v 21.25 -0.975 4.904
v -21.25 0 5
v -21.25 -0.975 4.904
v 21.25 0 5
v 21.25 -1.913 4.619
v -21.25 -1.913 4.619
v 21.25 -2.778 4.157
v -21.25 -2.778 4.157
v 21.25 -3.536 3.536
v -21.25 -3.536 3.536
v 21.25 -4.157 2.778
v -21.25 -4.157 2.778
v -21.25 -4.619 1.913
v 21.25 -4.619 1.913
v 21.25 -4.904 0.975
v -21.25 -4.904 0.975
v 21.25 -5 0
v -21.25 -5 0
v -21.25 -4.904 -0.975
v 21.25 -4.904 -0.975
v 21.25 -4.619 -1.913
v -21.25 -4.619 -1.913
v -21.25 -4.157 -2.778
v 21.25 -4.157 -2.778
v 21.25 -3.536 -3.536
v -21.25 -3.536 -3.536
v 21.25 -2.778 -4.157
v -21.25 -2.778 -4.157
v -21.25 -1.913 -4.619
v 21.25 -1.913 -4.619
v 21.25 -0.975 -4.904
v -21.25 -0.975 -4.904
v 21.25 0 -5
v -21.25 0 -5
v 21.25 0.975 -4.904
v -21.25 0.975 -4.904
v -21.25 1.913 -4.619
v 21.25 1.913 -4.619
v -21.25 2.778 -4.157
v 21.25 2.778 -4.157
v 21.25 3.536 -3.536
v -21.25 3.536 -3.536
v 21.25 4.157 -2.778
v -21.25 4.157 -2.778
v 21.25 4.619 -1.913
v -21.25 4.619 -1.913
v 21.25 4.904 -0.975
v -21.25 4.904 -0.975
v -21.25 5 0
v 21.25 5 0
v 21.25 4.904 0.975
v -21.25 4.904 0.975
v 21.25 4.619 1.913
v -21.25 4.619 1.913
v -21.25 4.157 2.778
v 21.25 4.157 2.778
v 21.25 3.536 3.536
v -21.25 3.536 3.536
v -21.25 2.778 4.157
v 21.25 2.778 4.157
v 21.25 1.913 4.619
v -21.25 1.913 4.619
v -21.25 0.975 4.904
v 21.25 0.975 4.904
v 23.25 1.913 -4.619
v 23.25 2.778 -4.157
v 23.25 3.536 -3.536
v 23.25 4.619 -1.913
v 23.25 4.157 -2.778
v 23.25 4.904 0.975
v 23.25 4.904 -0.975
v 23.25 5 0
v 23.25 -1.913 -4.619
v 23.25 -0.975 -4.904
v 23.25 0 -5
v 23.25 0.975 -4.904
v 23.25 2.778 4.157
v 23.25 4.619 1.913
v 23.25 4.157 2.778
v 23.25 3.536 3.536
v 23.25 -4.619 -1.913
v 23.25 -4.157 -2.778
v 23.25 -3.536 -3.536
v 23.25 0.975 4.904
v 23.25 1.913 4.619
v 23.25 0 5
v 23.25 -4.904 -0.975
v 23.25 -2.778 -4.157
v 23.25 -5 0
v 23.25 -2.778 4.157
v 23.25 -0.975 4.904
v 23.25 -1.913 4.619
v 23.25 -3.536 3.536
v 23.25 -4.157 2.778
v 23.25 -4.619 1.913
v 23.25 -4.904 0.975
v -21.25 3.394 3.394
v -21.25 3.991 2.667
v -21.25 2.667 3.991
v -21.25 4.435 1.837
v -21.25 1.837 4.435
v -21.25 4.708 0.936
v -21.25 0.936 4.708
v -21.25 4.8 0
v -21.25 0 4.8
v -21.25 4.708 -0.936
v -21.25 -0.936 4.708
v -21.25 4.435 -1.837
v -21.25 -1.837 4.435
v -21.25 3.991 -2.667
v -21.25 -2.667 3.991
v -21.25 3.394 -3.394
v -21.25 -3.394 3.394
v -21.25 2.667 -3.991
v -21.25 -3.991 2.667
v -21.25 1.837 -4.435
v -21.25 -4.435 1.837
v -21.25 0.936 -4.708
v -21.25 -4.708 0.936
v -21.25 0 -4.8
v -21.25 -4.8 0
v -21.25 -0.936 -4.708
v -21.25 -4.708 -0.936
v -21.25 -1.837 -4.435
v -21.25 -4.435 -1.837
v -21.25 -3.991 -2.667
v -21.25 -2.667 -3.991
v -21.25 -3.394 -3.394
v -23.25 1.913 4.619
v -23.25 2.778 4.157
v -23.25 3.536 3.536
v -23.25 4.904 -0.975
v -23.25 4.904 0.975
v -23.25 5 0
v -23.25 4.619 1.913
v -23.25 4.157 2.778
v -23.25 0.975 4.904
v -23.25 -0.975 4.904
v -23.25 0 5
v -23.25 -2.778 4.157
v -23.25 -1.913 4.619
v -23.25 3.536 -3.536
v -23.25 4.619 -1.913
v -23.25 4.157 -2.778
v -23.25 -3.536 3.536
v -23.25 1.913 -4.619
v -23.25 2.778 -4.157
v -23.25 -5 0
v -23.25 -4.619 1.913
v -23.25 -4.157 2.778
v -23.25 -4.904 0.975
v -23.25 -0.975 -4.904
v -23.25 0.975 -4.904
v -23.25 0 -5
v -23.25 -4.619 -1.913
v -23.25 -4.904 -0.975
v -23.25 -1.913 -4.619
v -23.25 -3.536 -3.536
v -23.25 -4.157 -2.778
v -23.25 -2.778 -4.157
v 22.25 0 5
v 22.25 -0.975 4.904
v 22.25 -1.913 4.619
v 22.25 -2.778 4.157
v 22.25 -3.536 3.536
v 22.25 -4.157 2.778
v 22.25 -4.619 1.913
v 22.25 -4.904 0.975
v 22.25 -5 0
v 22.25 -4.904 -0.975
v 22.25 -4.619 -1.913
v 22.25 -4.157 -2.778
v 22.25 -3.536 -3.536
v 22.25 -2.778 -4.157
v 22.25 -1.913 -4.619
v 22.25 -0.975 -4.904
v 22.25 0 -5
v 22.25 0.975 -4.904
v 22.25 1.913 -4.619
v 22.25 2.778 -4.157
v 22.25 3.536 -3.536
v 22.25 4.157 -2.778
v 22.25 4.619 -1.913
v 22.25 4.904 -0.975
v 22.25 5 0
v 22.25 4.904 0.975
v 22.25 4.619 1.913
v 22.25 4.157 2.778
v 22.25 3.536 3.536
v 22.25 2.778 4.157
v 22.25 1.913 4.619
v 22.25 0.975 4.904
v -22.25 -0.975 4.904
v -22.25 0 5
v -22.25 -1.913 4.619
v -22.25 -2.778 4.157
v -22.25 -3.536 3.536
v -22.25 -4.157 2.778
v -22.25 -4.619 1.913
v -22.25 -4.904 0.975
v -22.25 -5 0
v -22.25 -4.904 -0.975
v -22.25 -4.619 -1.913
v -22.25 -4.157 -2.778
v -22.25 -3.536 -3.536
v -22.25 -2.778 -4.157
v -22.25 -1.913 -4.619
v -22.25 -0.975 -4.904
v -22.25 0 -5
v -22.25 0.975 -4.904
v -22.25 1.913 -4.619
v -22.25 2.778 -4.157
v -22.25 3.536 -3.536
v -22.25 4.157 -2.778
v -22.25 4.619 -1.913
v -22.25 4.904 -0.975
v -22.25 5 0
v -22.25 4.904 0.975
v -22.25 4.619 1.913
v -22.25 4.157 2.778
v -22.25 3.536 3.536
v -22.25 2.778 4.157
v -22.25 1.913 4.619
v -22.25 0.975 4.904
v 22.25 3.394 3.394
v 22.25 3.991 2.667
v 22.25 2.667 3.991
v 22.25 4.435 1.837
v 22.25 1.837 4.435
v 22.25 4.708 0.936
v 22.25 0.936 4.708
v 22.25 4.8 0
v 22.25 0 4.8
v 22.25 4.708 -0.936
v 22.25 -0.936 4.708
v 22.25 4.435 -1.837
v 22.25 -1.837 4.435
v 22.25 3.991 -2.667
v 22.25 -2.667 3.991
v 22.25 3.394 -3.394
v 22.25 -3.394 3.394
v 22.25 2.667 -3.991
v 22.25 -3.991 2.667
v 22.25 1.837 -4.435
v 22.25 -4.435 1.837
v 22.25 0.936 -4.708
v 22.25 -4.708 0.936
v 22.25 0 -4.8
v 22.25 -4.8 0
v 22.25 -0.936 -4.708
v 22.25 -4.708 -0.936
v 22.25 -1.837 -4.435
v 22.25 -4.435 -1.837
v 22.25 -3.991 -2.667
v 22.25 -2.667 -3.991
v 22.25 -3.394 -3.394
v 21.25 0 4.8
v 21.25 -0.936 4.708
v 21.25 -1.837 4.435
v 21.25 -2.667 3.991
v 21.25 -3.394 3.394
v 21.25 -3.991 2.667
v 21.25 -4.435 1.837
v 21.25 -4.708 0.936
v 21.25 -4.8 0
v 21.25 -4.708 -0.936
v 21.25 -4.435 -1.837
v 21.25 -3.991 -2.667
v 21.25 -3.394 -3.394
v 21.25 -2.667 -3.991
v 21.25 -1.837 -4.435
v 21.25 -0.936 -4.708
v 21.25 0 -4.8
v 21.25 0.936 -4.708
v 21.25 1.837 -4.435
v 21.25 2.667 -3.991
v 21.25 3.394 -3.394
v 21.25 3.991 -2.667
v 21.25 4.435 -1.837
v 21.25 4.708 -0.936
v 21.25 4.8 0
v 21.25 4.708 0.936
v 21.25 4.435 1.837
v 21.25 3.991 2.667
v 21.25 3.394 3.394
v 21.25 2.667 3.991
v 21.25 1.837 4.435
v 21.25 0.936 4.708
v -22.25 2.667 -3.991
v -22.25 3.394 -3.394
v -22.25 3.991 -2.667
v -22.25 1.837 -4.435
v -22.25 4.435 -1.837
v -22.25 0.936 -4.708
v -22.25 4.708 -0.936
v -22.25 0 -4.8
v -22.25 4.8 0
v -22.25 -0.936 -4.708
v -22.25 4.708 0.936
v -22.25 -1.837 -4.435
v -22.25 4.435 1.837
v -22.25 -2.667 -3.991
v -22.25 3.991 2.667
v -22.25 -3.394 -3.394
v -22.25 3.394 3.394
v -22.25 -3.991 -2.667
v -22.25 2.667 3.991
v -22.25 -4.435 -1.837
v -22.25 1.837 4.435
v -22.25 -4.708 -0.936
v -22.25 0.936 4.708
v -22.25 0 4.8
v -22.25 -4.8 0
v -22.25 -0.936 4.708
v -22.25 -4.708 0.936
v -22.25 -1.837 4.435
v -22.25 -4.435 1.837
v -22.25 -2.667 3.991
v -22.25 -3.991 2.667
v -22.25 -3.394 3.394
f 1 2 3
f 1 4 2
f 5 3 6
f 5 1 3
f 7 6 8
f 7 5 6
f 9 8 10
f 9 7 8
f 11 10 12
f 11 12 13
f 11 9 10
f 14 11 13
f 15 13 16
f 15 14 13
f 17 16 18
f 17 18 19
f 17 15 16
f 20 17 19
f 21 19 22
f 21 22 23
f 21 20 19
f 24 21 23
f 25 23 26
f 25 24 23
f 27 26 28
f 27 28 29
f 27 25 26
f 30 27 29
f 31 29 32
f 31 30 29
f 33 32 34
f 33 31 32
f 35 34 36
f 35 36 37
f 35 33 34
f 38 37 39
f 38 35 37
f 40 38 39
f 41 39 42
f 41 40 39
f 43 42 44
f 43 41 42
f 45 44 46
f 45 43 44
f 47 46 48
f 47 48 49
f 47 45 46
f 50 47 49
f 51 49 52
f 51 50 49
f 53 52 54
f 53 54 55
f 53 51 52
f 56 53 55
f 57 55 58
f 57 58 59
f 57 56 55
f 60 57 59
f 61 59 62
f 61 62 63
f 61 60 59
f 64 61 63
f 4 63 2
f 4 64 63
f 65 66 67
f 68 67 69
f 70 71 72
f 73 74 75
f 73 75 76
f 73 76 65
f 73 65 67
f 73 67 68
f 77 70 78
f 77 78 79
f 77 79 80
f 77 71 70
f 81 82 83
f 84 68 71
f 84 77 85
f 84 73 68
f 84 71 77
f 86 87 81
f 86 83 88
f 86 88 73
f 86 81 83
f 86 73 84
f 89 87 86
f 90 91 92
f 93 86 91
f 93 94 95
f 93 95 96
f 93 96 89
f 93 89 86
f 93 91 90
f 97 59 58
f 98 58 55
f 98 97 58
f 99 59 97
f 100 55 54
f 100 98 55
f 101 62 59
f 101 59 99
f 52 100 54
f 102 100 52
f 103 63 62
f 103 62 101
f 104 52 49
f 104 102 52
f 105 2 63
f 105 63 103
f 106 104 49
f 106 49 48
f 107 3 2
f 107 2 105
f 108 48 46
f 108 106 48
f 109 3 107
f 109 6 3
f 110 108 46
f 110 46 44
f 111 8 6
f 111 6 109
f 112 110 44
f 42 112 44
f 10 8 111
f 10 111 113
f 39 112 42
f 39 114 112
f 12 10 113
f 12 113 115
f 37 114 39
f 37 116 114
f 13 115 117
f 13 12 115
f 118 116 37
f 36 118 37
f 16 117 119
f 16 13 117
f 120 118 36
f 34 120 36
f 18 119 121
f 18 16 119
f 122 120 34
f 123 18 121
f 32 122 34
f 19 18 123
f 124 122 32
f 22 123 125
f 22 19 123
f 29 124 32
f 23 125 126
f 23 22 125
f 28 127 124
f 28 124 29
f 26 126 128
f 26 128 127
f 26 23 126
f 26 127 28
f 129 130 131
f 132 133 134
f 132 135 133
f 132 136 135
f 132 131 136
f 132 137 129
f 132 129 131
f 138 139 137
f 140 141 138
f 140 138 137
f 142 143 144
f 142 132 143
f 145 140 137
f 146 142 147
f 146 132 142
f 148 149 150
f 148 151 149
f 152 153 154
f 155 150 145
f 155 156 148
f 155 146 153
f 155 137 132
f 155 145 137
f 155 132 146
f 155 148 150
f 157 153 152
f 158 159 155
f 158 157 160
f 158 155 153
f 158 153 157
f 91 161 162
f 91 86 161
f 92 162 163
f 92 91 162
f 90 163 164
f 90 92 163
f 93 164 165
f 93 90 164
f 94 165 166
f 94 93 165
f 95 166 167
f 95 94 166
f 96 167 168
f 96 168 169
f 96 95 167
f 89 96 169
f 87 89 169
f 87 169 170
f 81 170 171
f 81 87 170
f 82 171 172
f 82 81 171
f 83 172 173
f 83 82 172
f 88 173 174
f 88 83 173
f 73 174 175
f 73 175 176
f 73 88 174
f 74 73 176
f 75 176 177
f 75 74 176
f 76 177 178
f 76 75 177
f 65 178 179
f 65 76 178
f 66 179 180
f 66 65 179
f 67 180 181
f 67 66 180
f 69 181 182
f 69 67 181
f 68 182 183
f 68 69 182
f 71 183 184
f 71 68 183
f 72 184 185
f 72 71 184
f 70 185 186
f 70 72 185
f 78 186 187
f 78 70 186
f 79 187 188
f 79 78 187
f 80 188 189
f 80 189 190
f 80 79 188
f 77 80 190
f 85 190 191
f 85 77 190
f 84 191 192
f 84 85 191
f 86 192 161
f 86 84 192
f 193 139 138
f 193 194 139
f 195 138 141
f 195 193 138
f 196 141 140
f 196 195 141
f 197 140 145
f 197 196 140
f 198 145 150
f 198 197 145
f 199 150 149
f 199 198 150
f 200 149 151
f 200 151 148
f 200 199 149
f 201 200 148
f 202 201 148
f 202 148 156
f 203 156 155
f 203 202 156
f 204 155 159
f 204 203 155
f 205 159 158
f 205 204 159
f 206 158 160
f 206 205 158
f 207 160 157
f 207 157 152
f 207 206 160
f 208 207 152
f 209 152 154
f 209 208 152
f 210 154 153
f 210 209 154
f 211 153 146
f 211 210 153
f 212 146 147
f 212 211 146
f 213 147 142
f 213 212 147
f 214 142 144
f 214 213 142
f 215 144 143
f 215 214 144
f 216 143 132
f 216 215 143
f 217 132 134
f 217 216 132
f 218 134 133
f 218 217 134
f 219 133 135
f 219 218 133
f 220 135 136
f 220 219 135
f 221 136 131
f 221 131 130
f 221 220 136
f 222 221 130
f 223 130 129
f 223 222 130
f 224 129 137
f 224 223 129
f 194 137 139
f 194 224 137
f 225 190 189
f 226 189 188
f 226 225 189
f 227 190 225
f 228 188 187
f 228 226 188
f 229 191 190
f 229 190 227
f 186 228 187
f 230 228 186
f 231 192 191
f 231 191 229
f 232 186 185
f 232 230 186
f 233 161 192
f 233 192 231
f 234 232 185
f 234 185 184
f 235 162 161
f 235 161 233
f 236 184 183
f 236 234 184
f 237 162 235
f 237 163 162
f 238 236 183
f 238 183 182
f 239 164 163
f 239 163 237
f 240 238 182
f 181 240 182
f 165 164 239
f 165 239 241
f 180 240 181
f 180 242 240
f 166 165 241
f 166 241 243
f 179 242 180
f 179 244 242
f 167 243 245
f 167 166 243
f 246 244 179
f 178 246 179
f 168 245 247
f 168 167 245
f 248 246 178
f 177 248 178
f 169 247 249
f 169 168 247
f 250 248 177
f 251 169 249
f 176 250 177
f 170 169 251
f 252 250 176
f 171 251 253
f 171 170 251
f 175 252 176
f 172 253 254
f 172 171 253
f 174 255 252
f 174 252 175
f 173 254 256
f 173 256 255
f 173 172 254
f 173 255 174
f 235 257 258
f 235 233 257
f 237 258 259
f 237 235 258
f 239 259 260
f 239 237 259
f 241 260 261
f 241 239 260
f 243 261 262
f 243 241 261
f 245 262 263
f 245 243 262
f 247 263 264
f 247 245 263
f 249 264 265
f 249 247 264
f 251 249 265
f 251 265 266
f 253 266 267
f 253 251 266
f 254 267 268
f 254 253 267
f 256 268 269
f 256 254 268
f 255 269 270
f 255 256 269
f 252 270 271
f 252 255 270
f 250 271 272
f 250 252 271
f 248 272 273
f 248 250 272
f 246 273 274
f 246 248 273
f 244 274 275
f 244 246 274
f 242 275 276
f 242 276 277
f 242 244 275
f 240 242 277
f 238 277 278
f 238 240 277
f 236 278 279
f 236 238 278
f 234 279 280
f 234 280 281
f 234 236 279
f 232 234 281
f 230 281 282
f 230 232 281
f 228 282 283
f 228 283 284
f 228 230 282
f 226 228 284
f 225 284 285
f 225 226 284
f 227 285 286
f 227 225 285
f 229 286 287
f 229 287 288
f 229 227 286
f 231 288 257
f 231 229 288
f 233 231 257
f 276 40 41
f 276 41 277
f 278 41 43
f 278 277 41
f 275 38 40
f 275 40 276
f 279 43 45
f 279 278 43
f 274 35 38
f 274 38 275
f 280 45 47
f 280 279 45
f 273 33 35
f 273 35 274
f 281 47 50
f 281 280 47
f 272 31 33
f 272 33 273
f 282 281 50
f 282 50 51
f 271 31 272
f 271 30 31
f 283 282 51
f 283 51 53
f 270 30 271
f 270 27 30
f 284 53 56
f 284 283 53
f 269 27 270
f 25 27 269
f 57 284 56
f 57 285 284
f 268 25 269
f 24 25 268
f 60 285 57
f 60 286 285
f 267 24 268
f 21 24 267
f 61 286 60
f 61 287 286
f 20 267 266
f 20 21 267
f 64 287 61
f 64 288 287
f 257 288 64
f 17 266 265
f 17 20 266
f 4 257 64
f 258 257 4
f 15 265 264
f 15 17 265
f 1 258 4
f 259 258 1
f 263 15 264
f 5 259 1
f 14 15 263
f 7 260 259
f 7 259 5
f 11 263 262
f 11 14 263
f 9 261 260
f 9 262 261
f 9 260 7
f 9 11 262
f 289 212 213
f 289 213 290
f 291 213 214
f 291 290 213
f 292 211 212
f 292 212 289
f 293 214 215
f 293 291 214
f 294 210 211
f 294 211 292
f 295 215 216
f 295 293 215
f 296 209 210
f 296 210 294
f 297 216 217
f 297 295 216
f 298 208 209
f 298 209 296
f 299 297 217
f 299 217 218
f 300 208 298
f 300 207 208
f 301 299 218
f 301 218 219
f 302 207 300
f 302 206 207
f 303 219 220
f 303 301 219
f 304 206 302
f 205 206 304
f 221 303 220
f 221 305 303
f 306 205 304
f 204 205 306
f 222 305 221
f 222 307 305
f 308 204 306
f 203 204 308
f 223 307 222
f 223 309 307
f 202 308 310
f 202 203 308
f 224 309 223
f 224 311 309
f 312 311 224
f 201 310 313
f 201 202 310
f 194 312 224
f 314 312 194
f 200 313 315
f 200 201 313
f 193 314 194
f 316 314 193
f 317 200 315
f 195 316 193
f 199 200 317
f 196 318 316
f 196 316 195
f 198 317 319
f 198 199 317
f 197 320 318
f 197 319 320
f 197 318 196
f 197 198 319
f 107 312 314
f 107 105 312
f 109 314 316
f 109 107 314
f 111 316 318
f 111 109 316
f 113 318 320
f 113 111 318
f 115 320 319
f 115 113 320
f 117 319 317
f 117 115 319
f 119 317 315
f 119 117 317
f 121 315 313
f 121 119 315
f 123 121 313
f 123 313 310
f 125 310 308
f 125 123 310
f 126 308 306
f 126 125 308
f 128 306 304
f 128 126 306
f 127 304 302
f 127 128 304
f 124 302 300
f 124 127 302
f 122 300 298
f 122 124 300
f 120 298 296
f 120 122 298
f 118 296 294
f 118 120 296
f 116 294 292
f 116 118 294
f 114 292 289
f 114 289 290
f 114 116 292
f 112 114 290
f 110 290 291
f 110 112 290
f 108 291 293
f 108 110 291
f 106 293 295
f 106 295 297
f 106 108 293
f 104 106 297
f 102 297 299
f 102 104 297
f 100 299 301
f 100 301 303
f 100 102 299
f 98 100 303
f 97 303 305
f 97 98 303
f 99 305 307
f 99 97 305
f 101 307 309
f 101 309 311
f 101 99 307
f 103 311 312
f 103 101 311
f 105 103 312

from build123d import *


with BuildPart() as part:
    # Esboço1 → Revolução1 (revolve)
    with BuildSketch(Plane(origin=(0, 0, 0), x_dir=(1, 0, 0), z_dir=(0, 1, 0)), mode=Mode.PRIVATE) as revolu_o1_sk:
        Polygon((-23.25, 0), (-23.25, 5), (-22.25, 5), (-22.25, 4.8), (-21.25, 4.8), (-21.25, 5), (21.25, 5), (21.25, 4.8), (22.25, 4.8), (22.25, 5), (23.25, 5), (23.25, 0), align=None)
    revolve(revolu_o1_sk.sketch.rotate(Axis((-23.25, 0, 0), (1, 0, 0)), 180), axis=Axis((-23.25, 0, 0), (1, 0, 0)))


solid = part.part
